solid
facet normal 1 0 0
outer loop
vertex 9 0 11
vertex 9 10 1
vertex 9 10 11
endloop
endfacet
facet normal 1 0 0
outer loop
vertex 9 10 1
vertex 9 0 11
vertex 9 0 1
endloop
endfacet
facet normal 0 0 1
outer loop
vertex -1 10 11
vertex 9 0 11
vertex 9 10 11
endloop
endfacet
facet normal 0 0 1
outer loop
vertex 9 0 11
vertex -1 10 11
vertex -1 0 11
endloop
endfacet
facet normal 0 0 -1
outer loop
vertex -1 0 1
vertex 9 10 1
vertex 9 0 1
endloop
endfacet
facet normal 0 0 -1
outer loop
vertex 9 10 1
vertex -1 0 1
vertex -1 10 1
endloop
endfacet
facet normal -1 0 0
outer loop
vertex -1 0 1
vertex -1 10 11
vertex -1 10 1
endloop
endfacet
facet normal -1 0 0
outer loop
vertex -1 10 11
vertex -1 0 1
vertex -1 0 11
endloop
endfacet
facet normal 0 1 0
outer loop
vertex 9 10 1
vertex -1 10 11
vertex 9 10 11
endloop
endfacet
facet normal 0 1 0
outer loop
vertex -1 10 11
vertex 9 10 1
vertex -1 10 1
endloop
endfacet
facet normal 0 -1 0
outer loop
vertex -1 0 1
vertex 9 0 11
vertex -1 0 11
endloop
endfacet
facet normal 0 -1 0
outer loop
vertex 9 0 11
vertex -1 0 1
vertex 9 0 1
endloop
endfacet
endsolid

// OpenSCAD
//the root tree contains 2 non sense comment(s)

union() {
	//non sense comment
	color(c = "red") {
		translate(v = [0, 0, 1]) {
			translate(v = [-1, 0, 0]) {
				cube(size = 10);
			}
		}
	}
	//non sense comment
	color(c = "red") {
		translate(v = [0, 0, 1]) {
			translate(v = [-1, 0, 0]) {
				cube(size = 5);
			}
		}
	}
}
